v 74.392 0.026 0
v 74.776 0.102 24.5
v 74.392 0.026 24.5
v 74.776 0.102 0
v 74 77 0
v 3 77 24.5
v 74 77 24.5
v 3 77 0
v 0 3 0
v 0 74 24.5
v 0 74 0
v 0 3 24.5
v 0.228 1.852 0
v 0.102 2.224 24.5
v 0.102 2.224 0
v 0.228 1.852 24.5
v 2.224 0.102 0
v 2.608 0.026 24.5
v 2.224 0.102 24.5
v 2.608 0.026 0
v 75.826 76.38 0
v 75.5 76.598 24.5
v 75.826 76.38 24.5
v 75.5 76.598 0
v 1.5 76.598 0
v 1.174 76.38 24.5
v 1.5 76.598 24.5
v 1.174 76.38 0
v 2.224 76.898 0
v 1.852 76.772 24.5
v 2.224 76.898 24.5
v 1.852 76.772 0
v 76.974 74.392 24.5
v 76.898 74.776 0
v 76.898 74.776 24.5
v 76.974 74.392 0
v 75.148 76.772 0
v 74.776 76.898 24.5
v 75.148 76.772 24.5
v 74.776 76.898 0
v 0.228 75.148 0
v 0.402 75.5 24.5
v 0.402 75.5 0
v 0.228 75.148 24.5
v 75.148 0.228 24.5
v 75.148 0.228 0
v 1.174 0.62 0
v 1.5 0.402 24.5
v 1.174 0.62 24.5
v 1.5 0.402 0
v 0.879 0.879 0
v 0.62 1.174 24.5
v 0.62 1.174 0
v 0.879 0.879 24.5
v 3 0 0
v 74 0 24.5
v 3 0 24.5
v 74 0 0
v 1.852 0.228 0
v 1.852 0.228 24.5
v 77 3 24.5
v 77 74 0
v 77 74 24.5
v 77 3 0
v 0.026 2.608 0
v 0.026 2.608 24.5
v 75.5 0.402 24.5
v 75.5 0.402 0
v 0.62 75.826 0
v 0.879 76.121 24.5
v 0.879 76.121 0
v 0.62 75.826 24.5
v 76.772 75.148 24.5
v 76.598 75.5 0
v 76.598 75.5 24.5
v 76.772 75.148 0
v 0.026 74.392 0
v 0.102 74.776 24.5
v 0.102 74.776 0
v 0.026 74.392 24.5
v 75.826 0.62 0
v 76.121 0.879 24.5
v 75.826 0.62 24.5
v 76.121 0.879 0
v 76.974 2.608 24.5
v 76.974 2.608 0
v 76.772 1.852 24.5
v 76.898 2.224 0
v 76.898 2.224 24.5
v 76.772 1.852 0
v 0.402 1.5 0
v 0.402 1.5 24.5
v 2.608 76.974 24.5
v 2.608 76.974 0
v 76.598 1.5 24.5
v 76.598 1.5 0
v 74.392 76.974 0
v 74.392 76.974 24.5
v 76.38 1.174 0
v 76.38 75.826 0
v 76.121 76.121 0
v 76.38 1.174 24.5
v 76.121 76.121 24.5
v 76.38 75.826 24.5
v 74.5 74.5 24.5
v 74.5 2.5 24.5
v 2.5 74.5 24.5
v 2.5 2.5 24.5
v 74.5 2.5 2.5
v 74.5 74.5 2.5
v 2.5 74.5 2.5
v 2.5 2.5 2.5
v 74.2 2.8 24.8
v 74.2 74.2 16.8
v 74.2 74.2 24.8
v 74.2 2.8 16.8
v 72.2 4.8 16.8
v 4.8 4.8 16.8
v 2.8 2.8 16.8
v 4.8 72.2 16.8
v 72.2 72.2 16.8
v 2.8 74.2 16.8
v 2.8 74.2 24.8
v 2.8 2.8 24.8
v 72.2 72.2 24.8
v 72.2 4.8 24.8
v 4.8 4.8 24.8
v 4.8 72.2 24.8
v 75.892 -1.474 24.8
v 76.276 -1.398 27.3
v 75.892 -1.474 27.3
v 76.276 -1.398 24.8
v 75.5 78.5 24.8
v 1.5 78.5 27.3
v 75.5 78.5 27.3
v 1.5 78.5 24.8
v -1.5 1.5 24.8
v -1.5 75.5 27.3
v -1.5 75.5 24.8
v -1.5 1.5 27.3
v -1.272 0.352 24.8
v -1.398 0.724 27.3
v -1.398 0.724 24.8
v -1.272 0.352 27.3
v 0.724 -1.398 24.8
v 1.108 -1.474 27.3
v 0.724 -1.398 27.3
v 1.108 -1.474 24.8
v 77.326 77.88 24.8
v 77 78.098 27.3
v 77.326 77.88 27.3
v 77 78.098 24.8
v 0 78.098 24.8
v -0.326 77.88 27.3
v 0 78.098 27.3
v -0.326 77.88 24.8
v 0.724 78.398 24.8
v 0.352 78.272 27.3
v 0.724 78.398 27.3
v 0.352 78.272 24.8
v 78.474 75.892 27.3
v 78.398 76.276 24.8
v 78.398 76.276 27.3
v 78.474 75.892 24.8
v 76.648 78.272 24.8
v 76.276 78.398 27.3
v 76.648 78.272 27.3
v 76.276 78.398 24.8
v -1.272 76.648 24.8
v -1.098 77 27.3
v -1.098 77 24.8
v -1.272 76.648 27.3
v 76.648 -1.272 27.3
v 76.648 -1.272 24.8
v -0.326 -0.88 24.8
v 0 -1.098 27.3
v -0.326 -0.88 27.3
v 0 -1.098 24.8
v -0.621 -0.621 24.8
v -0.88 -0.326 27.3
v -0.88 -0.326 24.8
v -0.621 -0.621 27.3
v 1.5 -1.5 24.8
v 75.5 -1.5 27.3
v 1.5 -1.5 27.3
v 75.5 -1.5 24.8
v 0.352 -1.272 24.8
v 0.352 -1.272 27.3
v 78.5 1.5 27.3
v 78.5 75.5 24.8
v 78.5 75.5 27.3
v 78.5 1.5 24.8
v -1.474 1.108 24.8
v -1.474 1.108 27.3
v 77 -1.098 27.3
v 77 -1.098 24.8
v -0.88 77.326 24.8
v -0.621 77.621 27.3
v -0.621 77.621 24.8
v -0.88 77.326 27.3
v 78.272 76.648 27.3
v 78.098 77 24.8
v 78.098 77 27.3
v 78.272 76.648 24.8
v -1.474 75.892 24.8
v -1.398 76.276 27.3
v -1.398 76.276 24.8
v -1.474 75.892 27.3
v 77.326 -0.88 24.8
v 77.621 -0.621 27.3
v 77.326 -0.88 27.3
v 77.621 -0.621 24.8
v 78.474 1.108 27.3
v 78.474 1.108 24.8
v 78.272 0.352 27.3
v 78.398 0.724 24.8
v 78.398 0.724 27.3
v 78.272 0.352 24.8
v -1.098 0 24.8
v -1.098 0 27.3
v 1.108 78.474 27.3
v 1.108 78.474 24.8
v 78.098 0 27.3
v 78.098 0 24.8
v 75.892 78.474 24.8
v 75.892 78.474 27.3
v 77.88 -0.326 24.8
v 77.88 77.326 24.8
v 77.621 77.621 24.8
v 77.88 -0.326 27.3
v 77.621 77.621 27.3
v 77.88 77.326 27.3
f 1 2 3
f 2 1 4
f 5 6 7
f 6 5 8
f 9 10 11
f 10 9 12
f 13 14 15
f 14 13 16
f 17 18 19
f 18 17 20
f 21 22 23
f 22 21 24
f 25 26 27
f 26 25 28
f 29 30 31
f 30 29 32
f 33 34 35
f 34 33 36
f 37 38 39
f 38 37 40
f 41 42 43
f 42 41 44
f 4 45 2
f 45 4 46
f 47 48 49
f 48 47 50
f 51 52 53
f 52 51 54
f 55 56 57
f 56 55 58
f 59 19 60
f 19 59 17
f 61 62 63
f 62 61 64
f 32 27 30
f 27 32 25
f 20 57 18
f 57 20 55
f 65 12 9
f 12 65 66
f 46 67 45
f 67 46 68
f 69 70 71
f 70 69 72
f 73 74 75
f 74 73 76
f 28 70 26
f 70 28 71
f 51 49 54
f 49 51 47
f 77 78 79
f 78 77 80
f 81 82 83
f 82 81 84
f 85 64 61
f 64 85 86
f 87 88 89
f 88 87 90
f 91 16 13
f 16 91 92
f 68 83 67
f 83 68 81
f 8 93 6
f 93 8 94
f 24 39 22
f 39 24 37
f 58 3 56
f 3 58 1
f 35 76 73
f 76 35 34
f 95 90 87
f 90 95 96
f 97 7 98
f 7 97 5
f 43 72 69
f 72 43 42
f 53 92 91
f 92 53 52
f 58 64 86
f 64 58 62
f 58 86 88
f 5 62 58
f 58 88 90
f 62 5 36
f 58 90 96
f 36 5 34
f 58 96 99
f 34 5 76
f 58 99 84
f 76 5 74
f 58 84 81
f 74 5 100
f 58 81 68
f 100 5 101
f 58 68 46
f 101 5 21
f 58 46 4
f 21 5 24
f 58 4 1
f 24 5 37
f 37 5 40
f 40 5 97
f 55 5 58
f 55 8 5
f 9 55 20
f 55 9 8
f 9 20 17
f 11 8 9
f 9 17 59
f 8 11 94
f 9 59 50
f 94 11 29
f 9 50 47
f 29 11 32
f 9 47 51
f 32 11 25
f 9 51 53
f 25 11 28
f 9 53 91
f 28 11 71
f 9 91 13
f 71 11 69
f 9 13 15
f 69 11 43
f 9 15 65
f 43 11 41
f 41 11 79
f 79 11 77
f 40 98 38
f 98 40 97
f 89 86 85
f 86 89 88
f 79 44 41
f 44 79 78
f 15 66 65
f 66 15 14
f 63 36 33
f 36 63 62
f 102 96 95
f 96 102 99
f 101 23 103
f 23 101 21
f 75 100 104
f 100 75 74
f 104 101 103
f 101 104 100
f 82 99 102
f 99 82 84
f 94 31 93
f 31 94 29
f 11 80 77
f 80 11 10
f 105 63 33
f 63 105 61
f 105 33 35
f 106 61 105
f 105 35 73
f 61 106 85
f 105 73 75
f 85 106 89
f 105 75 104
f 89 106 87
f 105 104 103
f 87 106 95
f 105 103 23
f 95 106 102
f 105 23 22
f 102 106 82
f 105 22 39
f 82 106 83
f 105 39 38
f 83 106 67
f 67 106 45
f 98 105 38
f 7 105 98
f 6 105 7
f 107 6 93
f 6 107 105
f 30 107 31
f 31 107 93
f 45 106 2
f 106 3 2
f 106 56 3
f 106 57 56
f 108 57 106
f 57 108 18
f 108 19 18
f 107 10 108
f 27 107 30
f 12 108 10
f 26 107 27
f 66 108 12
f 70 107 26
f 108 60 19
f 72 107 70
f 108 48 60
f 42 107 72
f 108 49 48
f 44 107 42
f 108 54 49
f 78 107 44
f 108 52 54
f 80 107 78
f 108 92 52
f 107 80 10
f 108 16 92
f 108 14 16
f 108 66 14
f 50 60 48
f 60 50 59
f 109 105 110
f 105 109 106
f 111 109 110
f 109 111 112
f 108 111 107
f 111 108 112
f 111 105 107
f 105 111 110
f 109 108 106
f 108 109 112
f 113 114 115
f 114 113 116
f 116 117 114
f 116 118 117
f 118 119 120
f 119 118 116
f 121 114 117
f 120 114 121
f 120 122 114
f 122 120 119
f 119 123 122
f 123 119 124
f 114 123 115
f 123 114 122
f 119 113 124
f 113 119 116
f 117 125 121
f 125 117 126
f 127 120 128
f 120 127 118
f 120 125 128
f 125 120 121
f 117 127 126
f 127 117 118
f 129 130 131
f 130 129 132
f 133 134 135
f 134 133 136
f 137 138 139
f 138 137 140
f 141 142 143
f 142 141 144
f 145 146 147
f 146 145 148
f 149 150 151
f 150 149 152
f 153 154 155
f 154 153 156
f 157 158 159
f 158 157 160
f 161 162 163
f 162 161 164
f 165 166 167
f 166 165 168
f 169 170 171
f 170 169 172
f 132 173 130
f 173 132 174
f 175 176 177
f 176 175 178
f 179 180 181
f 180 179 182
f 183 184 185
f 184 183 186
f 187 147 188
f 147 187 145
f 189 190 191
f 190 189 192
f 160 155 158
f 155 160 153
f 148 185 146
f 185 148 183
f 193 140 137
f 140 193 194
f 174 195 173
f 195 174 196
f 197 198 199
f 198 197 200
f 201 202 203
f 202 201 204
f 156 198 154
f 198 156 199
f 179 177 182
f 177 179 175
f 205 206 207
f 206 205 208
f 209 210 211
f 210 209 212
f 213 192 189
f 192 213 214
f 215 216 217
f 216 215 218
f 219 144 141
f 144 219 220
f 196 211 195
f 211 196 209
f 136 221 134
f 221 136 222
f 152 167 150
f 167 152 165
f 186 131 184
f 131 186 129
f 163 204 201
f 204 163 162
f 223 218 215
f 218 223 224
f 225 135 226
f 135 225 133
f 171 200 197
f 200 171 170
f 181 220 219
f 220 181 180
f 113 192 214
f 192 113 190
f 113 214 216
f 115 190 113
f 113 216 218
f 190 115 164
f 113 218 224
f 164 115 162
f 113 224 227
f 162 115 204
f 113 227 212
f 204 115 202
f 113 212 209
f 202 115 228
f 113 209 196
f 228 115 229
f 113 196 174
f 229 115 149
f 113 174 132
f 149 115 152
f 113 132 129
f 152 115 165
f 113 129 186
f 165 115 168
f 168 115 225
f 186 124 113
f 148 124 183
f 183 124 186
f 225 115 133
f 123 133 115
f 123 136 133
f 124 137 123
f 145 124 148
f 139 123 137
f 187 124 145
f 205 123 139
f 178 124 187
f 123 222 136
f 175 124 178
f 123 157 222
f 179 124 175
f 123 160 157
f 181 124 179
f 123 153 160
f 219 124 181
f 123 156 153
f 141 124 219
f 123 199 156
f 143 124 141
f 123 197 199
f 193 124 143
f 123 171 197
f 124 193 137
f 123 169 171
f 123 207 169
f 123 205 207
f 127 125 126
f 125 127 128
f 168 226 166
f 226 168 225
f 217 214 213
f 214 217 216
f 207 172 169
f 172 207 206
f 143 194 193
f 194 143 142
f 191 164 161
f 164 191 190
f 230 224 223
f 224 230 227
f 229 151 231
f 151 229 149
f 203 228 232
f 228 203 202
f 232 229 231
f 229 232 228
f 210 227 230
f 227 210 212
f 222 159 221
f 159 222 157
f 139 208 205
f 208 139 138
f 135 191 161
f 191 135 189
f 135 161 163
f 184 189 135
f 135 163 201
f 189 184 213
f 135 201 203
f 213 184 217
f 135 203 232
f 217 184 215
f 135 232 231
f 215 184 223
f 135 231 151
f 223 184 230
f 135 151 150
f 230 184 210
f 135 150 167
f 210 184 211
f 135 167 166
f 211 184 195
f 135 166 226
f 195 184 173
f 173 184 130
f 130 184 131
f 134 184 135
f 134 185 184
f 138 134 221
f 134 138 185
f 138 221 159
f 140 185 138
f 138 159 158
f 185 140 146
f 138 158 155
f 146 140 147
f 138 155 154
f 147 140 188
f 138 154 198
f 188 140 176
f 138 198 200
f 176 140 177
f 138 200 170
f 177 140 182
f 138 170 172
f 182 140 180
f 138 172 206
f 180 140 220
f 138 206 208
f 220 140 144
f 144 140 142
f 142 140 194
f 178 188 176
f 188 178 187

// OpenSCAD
$fn = 48;

// Units: mm
wall = 2.5;
clearance = 0.30;

cavity_x = 72;
cavity_y = 72;
cavity_z = 22;

outer_x = cavity_x + 2 * wall;
outer_y = cavity_y + 2 * wall;
base_h = wall + cavity_z;

lid_thickness = 2.5;
lid_overhang = 1.5;
lid_skirt_h = 8;
skirt_wall = 2.0;

lid_outer_x = outer_x + 2 * lid_overhang;
lid_outer_y = outer_y + 2 * lid_overhang;

skirt_outer_x = cavity_x - 2 * clearance;
skirt_outer_y = cavity_y - 2 * clearance;
skirt_inner_x = skirt_outer_x - 2 * skirt_wall;
skirt_inner_y = skirt_outer_y - 2 * skirt_wall;

module rounded_box(size, r) {
    hull() {
        for (x = [r, size[0] - r])
            for (y = [r, size[1] - r])
                translate([x, y, 0])
                    cylinder(h = size[2], r = r);
    }
}

module base() {
    color("lightgray")
    difference() {
        rounded_box([outer_x, outer_y, base_h], 3);
        translate([wall, wall, wall])
            cube([cavity_x, cavity_y, cavity_z + 0.2]);
    }
}

module lid() {
    color("steelblue")
    union() {
        translate([-lid_overhang, -lid_overhang, base_h + clearance])
            rounded_box([lid_outer_x, lid_outer_y, lid_thickness], 3);

        translate([
            wall + clearance,
            wall + clearance,
            base_h + clearance - lid_skirt_h
        ])
        difference() {
            cube([skirt_outer_x, skirt_outer_y, lid_skirt_h]);
            translate([skirt_wall, skirt_wall, -0.1])
                cube([skirt_inner_x, skirt_inner_y, lid_skirt_h + 0.2]);
        }
    }
}

base();
lid();
